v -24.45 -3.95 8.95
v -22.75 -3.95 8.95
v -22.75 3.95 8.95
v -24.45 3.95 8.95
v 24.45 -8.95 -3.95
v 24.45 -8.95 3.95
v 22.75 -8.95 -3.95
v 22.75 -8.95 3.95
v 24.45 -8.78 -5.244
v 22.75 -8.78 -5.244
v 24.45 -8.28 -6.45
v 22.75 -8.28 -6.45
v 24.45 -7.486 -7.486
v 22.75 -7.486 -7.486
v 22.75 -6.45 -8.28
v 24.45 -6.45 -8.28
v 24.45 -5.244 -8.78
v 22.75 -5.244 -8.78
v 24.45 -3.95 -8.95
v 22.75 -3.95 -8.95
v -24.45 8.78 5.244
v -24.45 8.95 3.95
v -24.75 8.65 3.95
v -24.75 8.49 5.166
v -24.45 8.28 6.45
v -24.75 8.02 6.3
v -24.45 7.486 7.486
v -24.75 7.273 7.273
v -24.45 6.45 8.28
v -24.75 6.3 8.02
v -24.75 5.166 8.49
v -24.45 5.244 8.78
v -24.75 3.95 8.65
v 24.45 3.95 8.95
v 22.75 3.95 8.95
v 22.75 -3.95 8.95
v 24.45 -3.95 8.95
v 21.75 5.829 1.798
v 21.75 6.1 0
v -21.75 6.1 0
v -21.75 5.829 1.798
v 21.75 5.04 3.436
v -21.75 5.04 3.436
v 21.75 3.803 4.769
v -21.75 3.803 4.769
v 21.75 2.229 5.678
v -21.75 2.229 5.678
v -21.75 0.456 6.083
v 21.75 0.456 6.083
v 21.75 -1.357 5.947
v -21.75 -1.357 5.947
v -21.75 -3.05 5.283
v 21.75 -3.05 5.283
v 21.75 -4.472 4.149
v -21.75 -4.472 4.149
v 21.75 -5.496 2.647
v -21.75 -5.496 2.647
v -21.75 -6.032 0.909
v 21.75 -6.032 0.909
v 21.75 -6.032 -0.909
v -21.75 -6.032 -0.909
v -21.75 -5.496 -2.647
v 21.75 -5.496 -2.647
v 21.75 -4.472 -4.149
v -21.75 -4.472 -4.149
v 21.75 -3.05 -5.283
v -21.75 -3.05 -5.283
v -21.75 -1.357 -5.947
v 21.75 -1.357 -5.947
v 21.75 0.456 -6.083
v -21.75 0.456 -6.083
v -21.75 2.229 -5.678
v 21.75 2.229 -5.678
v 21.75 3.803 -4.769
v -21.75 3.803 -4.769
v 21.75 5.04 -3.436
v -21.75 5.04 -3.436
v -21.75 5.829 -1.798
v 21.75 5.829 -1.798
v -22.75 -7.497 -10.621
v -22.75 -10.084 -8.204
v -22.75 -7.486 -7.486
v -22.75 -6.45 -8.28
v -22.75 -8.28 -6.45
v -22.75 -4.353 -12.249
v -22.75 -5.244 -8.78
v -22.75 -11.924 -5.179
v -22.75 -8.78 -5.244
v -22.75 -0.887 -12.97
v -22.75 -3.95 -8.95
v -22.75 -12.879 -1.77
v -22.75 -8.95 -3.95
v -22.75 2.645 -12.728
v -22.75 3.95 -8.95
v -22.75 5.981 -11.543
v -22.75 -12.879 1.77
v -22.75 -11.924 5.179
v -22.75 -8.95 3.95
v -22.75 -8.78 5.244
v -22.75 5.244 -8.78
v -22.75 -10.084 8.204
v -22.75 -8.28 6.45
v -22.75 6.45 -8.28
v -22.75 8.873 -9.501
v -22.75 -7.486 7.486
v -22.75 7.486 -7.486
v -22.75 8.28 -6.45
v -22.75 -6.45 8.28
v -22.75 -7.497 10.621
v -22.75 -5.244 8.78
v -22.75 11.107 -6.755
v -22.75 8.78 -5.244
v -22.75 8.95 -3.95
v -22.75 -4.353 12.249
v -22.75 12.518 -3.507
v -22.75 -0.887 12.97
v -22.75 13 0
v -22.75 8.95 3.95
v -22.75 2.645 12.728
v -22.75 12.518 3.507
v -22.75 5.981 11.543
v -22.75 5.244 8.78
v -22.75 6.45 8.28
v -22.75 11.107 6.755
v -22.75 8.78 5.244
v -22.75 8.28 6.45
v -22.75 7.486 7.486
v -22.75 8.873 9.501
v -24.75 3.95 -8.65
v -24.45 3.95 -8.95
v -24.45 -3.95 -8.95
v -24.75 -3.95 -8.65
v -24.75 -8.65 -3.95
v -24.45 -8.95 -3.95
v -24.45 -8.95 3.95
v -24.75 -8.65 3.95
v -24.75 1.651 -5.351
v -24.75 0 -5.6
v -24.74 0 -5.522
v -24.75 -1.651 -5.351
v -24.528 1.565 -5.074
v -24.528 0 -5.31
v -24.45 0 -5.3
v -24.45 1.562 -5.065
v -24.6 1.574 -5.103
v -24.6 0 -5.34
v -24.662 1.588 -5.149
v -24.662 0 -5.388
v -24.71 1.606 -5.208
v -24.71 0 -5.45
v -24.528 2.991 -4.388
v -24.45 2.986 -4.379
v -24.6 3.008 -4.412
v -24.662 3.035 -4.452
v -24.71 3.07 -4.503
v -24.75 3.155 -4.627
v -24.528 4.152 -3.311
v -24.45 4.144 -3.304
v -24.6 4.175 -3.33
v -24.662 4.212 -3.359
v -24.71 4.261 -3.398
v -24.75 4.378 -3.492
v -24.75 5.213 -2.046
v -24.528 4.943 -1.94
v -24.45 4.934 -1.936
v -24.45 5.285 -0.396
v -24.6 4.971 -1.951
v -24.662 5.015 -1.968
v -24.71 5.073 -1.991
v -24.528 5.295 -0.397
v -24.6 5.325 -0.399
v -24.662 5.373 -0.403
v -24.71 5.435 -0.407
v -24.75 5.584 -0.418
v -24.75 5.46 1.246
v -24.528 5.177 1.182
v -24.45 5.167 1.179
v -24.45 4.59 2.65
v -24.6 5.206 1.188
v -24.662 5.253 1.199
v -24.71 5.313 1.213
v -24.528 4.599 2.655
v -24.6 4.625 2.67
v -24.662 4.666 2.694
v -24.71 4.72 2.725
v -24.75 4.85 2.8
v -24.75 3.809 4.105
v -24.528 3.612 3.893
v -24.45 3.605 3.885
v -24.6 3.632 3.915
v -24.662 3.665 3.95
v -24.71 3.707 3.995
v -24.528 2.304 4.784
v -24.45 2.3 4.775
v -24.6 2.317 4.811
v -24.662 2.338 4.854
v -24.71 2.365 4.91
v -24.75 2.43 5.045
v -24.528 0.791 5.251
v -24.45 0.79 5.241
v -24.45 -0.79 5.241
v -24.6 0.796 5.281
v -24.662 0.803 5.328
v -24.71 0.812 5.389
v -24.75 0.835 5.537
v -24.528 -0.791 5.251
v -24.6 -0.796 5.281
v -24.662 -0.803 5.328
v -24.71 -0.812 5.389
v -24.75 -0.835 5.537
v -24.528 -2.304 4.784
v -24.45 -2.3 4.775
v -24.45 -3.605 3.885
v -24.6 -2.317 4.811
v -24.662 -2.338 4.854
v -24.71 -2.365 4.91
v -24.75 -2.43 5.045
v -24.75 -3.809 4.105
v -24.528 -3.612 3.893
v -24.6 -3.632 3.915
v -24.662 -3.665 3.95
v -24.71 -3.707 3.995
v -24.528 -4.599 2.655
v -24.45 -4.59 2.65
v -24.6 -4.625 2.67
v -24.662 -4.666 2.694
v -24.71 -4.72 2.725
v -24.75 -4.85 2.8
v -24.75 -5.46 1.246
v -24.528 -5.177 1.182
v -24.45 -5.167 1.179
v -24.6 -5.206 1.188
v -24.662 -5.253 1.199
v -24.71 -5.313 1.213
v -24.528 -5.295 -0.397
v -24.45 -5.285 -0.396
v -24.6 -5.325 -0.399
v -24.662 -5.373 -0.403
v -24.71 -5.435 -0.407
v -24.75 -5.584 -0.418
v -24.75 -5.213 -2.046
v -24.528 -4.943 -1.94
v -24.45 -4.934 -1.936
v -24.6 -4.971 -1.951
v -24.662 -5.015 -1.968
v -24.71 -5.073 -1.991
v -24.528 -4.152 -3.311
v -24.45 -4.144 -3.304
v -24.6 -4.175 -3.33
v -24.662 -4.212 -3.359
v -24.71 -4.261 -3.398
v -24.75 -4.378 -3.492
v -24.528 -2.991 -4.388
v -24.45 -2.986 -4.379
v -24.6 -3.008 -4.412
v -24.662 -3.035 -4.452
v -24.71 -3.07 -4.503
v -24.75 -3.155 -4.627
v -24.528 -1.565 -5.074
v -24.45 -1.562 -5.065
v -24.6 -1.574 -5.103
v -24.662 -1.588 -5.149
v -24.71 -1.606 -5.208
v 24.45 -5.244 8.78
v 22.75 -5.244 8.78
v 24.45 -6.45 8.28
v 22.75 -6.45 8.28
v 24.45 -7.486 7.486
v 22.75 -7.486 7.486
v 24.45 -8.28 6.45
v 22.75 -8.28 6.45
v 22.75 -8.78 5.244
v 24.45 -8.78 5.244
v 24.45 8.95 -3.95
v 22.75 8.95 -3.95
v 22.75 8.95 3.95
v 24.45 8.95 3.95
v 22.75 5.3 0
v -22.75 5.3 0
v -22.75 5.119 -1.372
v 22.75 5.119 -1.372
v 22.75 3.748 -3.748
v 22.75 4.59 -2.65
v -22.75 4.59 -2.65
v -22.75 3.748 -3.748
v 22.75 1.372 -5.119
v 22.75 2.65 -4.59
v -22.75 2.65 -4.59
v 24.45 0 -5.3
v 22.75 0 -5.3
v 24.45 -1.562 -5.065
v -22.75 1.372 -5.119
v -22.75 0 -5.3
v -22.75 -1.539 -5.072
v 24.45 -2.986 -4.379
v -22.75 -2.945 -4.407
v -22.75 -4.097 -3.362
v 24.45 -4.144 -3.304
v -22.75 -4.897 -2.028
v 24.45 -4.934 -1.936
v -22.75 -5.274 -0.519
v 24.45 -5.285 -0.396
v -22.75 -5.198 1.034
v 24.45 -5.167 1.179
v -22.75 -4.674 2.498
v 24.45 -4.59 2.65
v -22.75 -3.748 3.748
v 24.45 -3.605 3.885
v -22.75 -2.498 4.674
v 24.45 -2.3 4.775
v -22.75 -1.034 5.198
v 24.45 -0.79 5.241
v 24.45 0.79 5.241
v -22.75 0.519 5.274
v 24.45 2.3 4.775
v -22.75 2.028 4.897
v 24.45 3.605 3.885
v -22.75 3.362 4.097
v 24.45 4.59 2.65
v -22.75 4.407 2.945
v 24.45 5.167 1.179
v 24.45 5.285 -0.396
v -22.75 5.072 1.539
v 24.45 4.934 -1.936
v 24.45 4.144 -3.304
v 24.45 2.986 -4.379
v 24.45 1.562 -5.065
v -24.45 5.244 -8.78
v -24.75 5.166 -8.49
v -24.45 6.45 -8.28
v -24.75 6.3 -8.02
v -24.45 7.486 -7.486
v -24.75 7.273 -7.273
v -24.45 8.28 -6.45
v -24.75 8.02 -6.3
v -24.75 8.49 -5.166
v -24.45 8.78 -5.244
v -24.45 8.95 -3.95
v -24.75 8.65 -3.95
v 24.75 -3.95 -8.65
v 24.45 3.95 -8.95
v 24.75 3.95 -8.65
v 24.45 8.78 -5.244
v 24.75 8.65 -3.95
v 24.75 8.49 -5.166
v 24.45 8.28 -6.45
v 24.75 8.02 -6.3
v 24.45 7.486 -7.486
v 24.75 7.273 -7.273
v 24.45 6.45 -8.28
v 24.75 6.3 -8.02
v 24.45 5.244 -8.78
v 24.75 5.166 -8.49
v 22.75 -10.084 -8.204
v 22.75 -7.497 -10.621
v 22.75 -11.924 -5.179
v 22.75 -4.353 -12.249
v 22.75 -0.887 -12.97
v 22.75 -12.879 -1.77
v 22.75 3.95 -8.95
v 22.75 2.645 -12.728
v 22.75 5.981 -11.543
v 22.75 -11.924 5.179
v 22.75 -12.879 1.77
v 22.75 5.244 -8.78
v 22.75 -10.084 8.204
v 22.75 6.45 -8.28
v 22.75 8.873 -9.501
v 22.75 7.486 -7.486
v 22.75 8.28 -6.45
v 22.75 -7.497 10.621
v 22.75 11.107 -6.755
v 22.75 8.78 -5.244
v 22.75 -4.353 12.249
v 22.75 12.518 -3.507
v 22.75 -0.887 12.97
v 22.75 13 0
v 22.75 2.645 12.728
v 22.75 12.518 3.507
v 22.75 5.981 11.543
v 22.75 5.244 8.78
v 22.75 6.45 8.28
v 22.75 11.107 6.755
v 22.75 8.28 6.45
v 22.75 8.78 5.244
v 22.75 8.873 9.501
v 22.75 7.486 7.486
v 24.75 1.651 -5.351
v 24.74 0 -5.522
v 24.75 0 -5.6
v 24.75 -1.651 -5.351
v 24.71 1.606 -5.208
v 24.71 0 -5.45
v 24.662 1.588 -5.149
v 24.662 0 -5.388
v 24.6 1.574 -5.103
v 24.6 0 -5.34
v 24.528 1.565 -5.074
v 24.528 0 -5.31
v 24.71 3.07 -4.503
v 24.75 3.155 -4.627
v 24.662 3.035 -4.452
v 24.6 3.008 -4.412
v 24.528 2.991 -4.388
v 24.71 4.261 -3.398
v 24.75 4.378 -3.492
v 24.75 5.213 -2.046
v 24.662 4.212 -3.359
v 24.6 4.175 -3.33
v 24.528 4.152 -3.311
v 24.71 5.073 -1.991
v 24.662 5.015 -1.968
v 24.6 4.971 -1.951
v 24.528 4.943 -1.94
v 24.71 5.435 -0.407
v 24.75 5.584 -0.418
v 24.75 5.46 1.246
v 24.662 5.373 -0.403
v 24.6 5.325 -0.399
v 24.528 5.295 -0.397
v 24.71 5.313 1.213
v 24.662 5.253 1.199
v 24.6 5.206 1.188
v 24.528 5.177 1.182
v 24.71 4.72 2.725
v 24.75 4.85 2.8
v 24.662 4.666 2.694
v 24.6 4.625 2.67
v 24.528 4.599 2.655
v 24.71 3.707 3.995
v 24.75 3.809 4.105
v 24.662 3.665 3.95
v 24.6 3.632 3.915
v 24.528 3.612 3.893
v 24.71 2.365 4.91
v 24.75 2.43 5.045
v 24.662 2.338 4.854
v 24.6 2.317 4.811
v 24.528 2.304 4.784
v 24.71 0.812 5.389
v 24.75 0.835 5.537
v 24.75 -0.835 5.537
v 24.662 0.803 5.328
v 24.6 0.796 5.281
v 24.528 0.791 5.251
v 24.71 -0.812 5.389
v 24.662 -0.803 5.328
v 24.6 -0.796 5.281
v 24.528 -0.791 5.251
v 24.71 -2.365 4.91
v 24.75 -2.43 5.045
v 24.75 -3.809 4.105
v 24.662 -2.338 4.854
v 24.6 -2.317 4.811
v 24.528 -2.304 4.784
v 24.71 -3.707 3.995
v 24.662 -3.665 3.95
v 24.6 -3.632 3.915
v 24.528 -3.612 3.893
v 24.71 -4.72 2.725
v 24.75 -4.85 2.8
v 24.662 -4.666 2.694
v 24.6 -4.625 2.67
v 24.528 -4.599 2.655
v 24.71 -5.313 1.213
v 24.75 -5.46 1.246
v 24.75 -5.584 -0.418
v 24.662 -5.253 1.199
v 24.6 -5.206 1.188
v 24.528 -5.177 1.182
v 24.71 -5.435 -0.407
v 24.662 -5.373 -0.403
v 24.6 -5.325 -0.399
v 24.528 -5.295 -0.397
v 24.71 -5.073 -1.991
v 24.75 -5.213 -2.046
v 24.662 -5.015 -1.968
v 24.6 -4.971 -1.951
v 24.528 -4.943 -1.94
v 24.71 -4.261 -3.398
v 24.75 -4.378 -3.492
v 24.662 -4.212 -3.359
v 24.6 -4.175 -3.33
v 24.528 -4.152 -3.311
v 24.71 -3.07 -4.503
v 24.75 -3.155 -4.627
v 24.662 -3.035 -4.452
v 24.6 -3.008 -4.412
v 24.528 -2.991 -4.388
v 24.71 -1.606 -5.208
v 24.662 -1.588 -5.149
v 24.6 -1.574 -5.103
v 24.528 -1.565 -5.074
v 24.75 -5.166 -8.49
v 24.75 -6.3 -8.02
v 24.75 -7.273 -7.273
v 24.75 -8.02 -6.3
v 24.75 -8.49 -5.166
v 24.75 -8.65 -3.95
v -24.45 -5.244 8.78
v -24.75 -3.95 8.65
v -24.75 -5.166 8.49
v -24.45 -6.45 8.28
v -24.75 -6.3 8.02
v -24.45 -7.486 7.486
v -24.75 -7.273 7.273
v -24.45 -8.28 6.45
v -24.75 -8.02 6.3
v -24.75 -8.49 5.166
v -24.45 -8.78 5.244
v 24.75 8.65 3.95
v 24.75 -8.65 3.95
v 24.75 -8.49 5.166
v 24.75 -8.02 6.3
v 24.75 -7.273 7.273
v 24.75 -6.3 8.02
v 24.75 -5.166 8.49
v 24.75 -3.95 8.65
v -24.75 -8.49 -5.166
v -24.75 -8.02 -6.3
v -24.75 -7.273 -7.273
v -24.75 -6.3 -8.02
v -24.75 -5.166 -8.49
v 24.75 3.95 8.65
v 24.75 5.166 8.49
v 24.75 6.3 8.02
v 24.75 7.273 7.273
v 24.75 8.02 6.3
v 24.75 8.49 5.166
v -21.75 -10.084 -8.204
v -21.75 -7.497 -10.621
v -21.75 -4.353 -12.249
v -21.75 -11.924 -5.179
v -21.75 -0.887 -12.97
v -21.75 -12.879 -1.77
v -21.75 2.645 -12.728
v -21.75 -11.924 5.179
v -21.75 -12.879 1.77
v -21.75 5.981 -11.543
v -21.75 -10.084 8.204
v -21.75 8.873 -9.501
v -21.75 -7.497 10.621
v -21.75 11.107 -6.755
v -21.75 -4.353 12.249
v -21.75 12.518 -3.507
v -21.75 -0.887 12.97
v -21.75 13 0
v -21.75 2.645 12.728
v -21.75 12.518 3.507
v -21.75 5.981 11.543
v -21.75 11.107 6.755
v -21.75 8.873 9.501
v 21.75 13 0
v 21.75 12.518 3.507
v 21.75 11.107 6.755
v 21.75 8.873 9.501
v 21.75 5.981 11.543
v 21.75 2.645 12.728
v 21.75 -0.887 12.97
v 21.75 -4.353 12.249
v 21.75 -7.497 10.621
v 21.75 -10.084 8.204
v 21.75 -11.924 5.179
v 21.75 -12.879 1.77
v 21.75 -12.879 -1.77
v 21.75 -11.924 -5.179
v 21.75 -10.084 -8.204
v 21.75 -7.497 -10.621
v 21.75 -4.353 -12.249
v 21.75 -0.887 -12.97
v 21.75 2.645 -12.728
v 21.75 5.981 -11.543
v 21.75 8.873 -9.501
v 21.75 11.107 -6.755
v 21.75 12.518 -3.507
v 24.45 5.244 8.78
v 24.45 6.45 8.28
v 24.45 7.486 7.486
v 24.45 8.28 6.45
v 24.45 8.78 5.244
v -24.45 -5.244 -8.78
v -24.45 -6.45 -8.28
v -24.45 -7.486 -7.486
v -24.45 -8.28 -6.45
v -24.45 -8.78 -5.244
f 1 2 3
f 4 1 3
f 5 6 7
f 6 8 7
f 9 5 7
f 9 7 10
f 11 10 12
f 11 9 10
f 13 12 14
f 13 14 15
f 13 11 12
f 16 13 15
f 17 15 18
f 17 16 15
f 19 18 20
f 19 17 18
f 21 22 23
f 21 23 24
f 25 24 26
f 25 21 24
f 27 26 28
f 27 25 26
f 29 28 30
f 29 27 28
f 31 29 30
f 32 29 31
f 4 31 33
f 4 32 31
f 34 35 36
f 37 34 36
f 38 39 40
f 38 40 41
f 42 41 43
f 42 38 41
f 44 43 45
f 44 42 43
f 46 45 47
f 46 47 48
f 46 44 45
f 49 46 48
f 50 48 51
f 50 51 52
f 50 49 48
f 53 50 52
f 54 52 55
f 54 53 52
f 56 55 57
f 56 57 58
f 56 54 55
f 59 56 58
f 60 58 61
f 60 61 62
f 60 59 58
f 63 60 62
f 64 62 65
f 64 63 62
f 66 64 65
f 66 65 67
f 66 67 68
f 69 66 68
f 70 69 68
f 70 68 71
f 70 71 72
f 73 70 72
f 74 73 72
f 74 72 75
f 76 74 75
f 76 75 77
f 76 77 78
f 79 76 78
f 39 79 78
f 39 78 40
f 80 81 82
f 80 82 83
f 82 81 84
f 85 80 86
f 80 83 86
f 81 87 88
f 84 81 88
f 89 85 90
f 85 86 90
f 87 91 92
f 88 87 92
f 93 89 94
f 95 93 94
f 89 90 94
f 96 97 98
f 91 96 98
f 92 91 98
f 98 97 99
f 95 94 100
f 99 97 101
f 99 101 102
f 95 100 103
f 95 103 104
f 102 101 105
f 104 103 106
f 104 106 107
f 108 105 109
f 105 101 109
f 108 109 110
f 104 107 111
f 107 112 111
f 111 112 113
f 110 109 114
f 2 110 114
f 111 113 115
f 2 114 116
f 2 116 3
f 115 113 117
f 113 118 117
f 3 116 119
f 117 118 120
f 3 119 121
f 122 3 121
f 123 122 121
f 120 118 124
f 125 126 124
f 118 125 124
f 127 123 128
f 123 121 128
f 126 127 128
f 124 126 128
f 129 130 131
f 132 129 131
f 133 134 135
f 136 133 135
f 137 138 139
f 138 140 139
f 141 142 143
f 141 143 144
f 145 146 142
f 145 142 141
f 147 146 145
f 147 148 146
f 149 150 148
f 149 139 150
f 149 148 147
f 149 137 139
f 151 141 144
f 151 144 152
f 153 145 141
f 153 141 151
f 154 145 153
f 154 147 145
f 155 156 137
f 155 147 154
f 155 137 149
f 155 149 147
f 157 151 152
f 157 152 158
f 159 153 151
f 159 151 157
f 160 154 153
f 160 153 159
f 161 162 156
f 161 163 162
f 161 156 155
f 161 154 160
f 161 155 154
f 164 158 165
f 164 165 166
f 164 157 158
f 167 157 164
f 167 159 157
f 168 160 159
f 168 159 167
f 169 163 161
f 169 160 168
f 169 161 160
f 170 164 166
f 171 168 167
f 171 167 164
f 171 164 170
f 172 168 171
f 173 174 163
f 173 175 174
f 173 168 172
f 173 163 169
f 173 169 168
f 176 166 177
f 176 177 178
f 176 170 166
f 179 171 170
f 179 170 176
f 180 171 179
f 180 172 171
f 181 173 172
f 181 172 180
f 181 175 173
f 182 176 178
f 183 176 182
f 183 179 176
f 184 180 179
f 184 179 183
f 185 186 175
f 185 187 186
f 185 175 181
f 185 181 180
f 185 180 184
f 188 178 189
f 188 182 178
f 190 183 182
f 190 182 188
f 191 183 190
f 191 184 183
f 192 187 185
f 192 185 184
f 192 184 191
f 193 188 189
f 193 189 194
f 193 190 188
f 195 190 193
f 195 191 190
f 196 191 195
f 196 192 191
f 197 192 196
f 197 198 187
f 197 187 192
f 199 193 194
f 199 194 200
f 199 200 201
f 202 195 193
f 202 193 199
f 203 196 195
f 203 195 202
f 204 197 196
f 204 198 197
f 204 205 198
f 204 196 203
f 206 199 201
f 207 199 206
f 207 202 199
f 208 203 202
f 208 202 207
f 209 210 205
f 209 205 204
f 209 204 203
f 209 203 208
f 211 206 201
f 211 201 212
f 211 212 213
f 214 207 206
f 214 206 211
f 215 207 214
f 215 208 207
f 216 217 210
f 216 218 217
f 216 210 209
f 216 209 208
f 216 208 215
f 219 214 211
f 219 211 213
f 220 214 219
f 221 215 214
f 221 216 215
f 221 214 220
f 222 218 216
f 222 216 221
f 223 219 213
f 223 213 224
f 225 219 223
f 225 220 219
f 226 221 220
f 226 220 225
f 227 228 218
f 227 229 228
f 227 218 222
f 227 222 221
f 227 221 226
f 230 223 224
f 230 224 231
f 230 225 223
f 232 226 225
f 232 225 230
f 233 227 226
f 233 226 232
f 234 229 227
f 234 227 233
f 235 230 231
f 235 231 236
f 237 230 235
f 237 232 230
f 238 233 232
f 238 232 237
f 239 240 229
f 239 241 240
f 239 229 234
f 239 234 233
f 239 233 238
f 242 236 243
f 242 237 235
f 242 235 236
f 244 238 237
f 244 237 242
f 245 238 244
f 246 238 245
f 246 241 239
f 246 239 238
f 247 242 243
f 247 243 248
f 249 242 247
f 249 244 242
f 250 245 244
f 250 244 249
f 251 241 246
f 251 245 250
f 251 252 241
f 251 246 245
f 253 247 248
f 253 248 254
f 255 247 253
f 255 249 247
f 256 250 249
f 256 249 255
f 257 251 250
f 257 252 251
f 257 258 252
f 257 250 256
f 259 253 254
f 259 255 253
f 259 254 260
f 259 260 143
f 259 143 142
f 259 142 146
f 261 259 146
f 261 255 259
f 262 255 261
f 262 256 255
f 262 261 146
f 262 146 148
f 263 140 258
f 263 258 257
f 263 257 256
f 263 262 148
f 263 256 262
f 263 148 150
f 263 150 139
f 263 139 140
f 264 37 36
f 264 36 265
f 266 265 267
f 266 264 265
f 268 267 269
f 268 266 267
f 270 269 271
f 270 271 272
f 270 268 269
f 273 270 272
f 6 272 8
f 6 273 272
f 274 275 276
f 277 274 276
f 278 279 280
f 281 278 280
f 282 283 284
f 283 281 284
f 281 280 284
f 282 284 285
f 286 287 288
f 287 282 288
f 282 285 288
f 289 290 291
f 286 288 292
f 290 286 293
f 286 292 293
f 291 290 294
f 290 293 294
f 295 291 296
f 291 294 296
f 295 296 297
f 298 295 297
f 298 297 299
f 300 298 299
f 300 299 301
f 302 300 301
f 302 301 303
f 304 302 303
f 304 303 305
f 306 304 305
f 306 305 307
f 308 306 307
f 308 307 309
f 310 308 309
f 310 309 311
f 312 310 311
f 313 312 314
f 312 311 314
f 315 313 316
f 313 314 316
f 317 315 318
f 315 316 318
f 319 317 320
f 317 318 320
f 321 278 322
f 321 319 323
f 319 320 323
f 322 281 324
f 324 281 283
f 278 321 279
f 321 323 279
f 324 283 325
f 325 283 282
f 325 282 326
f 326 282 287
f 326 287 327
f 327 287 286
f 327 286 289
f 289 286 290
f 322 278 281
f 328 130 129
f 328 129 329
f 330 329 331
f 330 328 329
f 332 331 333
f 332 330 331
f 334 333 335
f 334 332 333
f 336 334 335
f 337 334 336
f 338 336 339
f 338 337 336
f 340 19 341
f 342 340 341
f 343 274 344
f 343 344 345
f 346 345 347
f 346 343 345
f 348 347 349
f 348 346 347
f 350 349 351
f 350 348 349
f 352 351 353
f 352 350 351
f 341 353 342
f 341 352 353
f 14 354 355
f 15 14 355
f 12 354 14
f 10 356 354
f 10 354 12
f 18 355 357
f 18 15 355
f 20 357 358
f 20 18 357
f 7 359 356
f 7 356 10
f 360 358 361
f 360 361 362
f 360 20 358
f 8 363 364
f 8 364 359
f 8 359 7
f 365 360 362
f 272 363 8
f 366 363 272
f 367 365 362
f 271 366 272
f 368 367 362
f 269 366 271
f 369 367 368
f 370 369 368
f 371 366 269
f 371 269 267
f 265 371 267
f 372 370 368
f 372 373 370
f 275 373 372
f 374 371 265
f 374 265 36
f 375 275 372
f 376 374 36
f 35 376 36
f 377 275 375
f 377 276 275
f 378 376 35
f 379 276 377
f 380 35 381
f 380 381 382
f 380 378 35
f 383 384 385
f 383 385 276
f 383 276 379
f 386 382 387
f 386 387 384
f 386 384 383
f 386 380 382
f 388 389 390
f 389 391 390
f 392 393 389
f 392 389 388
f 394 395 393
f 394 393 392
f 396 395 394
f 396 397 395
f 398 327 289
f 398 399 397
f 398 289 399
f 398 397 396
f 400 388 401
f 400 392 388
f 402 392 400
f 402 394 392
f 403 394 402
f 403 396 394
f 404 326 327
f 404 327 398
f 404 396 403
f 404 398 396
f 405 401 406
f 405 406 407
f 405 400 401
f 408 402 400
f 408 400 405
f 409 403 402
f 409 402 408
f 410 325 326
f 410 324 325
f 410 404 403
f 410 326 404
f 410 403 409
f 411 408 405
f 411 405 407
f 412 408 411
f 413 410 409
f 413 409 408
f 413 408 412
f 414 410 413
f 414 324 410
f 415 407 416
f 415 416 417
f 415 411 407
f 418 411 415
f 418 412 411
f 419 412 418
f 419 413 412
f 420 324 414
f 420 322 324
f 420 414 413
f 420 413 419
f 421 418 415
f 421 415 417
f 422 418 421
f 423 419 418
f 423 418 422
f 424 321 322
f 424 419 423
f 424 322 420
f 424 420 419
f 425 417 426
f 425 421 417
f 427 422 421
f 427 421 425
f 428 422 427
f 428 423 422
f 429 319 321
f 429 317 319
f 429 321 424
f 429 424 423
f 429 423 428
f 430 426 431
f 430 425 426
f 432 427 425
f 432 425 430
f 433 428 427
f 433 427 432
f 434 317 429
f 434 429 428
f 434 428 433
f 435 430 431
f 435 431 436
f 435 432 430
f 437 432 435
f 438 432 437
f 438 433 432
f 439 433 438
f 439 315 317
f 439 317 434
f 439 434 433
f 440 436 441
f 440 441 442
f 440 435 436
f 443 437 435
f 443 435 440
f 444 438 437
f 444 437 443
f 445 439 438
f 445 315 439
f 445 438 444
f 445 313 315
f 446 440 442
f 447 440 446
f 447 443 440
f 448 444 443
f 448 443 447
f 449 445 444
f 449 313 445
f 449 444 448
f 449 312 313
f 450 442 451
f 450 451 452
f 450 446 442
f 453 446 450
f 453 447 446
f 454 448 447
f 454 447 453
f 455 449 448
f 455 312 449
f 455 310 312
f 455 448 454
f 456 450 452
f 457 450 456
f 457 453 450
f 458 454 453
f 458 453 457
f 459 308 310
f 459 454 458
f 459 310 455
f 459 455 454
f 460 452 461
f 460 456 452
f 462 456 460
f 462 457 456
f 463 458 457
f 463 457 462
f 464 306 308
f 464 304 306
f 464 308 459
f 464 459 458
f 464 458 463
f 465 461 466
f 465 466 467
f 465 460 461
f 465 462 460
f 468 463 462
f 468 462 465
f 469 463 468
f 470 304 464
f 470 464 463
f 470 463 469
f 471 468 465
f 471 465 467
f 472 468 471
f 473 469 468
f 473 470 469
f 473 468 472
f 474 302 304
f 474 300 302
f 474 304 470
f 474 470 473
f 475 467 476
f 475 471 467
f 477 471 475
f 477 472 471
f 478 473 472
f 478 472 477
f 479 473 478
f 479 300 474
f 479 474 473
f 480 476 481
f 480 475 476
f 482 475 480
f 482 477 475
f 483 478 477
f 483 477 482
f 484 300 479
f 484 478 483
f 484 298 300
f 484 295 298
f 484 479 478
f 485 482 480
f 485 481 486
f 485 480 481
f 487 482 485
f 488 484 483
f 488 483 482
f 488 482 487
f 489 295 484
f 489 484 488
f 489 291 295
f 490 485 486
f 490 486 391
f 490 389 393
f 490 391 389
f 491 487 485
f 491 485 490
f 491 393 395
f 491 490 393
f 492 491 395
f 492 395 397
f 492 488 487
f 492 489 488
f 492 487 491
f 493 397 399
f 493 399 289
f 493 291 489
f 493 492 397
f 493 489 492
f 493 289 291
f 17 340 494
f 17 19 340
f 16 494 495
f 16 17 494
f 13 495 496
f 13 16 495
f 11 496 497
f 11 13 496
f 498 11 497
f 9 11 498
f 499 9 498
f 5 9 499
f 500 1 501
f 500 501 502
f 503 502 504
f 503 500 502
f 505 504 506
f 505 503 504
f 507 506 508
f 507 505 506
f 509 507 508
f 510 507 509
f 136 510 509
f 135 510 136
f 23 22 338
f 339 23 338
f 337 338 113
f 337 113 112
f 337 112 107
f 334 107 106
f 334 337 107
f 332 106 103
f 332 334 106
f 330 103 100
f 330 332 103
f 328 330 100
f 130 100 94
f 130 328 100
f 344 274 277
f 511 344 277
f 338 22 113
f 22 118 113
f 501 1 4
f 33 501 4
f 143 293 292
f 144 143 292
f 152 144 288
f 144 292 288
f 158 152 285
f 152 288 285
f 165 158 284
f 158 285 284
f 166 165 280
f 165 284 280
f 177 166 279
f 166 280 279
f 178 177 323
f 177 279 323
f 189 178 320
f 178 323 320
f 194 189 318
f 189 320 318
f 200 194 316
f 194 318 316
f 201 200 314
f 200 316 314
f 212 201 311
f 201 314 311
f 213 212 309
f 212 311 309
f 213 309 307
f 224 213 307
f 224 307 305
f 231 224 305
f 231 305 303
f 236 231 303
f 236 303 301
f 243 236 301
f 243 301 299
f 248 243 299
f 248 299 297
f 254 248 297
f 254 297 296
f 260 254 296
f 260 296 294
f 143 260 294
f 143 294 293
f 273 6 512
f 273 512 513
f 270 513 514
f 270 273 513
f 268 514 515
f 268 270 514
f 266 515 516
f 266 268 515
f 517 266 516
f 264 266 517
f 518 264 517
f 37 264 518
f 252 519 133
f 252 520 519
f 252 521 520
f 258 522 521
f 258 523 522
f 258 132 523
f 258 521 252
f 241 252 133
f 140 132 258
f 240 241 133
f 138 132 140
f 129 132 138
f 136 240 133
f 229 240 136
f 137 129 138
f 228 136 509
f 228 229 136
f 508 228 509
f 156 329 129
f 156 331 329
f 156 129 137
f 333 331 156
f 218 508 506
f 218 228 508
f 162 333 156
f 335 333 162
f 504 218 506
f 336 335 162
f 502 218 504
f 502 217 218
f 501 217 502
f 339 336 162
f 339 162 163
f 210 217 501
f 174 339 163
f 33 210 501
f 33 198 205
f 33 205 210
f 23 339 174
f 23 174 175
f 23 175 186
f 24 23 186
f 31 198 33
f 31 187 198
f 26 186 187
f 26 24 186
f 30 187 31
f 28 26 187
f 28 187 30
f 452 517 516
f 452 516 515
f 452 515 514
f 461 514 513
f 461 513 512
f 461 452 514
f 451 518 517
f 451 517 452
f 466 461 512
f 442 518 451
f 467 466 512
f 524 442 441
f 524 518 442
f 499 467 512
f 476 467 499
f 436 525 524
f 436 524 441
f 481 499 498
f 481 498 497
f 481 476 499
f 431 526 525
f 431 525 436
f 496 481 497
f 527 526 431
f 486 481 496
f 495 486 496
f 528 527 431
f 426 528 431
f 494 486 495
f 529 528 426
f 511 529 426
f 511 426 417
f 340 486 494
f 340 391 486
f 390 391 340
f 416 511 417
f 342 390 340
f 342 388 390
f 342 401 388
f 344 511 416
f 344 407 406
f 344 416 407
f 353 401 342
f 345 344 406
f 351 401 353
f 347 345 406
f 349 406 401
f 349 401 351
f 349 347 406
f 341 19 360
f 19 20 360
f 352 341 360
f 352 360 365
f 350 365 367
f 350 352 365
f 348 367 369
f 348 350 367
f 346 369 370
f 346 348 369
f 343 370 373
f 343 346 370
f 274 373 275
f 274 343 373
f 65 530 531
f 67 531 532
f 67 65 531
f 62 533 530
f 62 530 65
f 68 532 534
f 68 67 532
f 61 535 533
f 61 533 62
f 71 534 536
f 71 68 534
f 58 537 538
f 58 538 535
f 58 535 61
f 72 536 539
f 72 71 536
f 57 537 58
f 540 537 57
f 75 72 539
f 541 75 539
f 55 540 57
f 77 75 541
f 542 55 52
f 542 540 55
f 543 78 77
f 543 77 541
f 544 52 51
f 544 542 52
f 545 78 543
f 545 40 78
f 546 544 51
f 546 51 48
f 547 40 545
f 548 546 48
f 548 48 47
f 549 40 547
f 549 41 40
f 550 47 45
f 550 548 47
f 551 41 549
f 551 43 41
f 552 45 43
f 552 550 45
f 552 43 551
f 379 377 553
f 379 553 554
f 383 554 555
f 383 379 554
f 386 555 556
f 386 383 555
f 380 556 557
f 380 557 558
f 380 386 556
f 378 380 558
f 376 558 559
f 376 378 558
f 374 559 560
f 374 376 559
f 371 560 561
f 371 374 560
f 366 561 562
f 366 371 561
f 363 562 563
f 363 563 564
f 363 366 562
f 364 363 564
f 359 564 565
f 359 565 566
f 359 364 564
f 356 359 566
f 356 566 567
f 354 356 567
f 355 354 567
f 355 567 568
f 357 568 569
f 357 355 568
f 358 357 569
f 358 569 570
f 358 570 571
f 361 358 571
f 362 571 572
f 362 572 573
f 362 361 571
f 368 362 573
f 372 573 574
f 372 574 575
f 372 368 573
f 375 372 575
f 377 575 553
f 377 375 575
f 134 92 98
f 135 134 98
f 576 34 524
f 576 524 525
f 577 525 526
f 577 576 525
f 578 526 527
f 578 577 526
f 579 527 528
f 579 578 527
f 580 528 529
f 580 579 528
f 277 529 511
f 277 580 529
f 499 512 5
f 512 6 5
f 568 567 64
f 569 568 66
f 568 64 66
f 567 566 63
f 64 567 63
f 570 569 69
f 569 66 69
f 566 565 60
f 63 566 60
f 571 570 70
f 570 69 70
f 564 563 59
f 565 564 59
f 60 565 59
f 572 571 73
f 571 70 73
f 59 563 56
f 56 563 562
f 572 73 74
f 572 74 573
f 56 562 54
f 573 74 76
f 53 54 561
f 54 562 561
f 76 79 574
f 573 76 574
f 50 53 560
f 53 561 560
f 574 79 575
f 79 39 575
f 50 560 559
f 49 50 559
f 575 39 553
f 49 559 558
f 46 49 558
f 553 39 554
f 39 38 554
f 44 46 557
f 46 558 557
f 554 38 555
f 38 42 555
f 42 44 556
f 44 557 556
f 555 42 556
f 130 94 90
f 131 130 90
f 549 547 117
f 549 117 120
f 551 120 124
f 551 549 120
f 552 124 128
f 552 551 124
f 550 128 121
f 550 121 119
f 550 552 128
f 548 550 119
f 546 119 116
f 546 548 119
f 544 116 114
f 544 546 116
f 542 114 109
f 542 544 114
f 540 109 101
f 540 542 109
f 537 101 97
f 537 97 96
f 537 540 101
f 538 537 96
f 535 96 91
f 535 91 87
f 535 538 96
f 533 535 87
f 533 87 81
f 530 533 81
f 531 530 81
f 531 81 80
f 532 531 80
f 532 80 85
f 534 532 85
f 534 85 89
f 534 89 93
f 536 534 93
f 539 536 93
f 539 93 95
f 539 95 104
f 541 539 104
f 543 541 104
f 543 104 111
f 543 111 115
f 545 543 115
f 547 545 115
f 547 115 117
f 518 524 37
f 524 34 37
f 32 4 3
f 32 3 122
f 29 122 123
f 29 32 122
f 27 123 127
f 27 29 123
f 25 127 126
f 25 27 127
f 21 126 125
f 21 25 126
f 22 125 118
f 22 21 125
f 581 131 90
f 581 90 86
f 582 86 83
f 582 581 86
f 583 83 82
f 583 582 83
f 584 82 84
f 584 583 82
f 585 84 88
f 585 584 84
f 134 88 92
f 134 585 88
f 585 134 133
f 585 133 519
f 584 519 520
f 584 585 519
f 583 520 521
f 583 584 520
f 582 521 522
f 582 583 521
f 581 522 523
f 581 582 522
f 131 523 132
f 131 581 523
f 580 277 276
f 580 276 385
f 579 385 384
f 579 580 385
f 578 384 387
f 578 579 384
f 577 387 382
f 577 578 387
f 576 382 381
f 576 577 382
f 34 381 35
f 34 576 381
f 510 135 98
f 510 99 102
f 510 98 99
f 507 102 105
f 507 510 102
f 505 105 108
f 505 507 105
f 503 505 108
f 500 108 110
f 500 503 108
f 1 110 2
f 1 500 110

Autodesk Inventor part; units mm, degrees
ref_plane "YZ Plane" through (0, 0, 0) normal (1, 0, 0) x (0, 1, 0)
ref_plane "XZ Plane" through (0, 0, 0) normal (0, 1, 0) x (-1, 0, 0)
ref_plane "XY Plane" through (0, 0, 0) normal (0, 0, 1) x (1, 0, 0)
sketch "Skizze1" plane through (0, 0, 0) normal (0, 0, 1) x (1, 0, 0)
  line L0 (22.75, 13) -> (22.75, 5.3)
  line L1 (22.75, 5.3) -> (-22.75, 5.3)
  line L2 (-22.75, 5.3) -> (-22.75, 13)
  line L3 (-22.75, 0) -> (22.75, 0)
  line L4 (-22.75, 13) -> (-21.75, 13)
  line L5 (-21.75, 13) -> (-21.75, 6.1)
  line L6 (-21.75, 6.1) -> (21.75, 6.1)
  line L7 (21.75, 6.1) -> (21.75, 13)
  line L8 (21.75, 13) -> (22.75, 13)
  point P0 (0, 0)
  point P1 (0, 5.3)
  point P2 (0, 0)
  dimension "d0" = 10.6
  dimension "d2" = 45.5
  dimension "d8" = 1
  dimension "d9" = 0.8
  dimension "d10" = 26
revolve "Umdrehung1" add sketch "Skizze1" angle 360 about axis through (-22.75, 0, 0) along (1, 0, 0)
sketch "Skizze3" plane through (22.75, 0, 0) normal (1, 0, 0) x (0, 0, -1)
  line L0 (-8.95, -8.95) -> (8.95, -8.95)
  line L1 (8.95, -8.95) -> (8.95, 8.95)
  line L2 (8.95, 8.95) -> (-8.95, 8.95)
  line L3 (-8.95, 8.95) -> (-8.95, -8.95)
  line L4 (-8.95, -8.95) -> (8.95, 8.95) construction
  line L5 (8.95, -8.95) -> (-8.95, 8.95) construction
  circle A0 centre (0, 0) radius 5.3 projected
  point P0 (0, 0)
  dimension "d11" = 17.9
extrude "Extrusion2" add sketch "Skizze3" along normal blind 2
fillet "Rundung2" radius 5 4 edges at (23.75, 8.95, 8.95) (23.75, 8.95, -8.95) (23.75, -8.95, 8.95) (23.75, -8.95, -8.95)
mirror "Spiegeln1" about plane through (0, 0, 0) normal (1, 0, 0) of "Extrusion2", "Rundung2"
chamfer "Fase1" distance 0.3 angle 45 4 edges at (-24.75, 0, -8.95) (-24.75, 8.95, 0) (-24.75, 0, 8.95) (-24.75, -8.95, 0)
chamfer "Fase2" distance 0.3 angle 45 4 edges at (24.75, 0, -8.95) (24.75, 8.95, 0) (24.75, 0, 8.95) (24.75, -8.95, 0)
fillet "Rundung5" radius 0.3 1 edges at (24.75, 0, 5.3)
fillet "Rundung6" radius 0.3 1 edges at (-24.75, 0, 5.3)
sketch "Skizze4" plane through (24.75, 0, 0) normal (1, 0, 0) x (0, 0, -1)
  circle A0 centre (0, 0) radius 15
  point P0 (0, 0)
ref_plane "Arbeitsebene1" through (0, 0, 0) normal (1, 0, 0) x (0, 1, 0)
properties part number "Hüllse mit Isolator" material "Nylon 6/6"
